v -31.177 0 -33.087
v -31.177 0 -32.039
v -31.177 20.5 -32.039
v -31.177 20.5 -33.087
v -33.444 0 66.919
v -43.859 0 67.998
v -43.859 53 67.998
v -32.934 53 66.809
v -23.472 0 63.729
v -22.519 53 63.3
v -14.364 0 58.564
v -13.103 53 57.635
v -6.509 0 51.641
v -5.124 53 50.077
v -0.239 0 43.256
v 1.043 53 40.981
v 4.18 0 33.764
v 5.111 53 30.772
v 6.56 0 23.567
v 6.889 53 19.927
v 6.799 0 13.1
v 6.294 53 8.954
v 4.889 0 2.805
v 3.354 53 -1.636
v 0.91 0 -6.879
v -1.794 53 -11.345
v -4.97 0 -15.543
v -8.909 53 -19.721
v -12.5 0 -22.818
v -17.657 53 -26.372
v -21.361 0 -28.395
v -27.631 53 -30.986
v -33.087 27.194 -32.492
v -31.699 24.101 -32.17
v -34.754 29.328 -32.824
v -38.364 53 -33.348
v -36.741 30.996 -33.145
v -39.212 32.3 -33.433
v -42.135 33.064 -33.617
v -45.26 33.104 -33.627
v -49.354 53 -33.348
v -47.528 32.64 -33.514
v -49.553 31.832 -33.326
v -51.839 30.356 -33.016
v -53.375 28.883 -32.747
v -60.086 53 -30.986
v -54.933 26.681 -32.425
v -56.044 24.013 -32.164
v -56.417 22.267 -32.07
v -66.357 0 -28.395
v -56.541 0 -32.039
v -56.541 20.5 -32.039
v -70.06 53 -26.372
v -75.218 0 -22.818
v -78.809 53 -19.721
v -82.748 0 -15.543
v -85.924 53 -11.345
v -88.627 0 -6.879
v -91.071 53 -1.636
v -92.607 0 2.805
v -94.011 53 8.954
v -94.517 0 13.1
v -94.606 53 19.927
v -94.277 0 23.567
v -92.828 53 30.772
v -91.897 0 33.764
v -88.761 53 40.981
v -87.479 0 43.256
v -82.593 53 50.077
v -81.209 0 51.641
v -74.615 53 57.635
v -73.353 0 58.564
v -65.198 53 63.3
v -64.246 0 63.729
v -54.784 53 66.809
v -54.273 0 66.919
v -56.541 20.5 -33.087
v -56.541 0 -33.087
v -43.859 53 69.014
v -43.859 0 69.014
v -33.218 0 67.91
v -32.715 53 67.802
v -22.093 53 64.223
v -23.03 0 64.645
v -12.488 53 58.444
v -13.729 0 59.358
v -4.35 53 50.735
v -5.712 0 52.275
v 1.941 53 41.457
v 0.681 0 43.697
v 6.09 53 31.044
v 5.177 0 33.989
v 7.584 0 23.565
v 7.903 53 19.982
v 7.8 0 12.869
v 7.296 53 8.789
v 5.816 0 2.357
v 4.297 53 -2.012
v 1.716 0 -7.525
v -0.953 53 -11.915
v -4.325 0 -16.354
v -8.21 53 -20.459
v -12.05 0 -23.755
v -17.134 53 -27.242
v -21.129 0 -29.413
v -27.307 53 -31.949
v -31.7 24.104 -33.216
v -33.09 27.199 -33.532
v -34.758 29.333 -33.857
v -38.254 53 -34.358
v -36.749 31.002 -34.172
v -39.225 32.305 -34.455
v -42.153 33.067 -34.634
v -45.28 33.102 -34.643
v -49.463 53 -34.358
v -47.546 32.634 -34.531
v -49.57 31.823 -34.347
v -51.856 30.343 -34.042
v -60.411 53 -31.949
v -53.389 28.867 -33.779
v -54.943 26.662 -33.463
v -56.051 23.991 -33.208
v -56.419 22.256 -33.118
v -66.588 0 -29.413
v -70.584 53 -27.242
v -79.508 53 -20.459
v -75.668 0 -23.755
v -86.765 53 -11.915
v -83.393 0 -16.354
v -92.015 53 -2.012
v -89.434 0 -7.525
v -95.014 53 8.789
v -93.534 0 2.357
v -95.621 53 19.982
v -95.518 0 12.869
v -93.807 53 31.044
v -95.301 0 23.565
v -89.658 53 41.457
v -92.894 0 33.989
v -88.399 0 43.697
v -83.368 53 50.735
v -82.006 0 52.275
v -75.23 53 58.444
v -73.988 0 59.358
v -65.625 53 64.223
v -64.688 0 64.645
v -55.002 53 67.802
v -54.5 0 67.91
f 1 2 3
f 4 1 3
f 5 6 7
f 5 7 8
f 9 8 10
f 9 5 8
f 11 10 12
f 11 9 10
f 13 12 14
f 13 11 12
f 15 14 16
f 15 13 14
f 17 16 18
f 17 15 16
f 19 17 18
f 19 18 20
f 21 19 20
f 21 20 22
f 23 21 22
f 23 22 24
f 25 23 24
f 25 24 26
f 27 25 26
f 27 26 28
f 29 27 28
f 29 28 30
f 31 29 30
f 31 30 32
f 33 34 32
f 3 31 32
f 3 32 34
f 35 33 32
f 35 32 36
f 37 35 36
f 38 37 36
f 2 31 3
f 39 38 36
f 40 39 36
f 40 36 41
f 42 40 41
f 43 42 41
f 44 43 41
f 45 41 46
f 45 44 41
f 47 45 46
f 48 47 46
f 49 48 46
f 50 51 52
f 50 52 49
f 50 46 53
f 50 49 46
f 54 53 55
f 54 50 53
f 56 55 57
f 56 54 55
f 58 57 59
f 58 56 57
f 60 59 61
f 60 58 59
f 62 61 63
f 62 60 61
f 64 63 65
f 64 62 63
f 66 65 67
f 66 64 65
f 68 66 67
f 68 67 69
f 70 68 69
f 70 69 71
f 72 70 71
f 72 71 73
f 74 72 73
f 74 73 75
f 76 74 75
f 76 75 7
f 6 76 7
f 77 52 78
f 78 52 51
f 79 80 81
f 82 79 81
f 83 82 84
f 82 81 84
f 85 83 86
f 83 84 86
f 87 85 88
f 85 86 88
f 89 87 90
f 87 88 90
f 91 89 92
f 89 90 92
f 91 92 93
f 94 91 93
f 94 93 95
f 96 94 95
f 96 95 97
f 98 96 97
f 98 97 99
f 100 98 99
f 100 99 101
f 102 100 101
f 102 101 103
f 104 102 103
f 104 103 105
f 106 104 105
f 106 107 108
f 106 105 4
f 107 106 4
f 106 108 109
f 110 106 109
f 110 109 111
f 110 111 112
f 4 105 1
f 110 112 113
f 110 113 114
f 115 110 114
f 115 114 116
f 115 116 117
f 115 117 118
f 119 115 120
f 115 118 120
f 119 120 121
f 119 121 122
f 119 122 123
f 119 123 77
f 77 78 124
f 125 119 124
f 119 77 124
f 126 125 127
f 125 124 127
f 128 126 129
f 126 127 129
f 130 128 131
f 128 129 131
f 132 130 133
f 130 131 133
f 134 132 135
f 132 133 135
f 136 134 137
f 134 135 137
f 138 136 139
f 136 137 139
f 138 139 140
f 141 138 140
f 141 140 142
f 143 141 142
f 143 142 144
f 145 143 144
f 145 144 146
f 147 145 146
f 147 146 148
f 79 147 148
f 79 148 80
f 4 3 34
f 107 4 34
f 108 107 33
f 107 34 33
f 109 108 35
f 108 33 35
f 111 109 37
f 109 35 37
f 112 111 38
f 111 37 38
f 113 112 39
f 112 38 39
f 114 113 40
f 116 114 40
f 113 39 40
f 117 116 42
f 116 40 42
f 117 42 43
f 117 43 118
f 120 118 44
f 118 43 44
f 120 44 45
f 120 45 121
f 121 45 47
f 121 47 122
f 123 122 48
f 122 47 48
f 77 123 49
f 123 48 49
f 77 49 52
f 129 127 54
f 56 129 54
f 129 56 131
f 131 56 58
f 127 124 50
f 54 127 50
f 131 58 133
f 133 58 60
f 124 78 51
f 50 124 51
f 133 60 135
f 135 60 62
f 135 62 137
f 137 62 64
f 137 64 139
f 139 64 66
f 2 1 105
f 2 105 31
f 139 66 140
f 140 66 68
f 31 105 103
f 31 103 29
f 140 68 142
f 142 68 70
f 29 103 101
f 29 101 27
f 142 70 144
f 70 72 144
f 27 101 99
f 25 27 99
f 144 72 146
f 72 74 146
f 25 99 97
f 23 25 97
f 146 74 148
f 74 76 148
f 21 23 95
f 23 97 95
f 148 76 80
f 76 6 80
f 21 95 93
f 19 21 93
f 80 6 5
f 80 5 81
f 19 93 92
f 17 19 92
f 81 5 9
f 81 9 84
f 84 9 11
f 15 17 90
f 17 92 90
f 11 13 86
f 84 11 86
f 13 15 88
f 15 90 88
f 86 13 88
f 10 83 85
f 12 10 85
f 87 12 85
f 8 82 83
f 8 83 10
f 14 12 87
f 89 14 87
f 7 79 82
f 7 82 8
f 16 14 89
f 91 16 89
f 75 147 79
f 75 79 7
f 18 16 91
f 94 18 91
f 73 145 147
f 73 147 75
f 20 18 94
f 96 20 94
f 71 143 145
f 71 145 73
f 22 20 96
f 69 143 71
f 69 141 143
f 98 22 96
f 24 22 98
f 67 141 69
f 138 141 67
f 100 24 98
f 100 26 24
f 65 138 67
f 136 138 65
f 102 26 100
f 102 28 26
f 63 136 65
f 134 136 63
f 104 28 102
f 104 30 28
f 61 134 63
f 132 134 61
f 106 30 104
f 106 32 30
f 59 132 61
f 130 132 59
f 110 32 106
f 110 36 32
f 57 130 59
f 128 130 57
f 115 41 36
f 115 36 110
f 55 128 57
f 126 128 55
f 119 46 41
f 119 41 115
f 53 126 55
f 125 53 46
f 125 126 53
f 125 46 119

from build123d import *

# Parameters (mm, degrees)
SKETCH1_R           = 51.838
SKETCH1_R_2         = 50.822
BOSS_EXTRUDE1_DEPTH = 54
CUT_EXTRUDE1_DEPTH  = 53
CUT_EXTRUDE2_START  = -1
SKETCH3_R           = 51.838
SKETCH3_R_2         = 50.822
CUT_EXTRUDE2_DEPTH  = 1


with BuildPart() as part:
    # Sketch1 → Boss-Extrude1 (new body)
    with BuildSketch(Plane(origin=(0, 0, 0), x_dir=(1, 0, 0), z_dir=(0, 1, 0))):
        with Locations(Location((-43.858802719, -17.175645915, 0), (0, 0, 270))):
            Circle(SKETCH1_R)
        with Locations(Location((-43.858802719, -17.175645915, 0), (0, 0, 270))):
            Circle(SKETCH1_R_2, mode=Mode.SUBTRACT)
    extrude(amount=BOSS_EXTRUDE1_DEPTH)

    # Sketch2 → Cut-Extrude1 (cut)
    with BuildSketch(Plane.XY):
        with BuildLine():
            Line((-56.540802719, 20.5), (-56.540802719, -11.133422885))
            Line((-56.540802719, -11.133422885), (-31.176802719, -11.133422885))
            Line((-31.176802719, -11.133422885), (-31.176802719, 20.5))
            ThreePointArc((-31.176802719, 20.5), (-43.858802719, 33.182), (-56.540802719, 20.5))
        make_face()
    extrude(amount=-CUT_EXTRUDE1_DEPTH, mode=Mode.SUBTRACT)

    # Sketch3 → Cut-Extrude2 (cut)
    with BuildSketch(Plane(origin=(0, 54, 0), x_dir=(1, 0, 0), z_dir=(0, 1, 0)).offset(CUT_EXTRUDE2_START)):
        with Locations(Location((-43.858802719, -17.175645915, 0), (0, 0, 75.839039259))):
            Circle(SKETCH3_R)
        with Locations(Location((-43.858802719, -17.175645915, 0), (0, 0, 75.54984846))):
            Circle(SKETCH3_R_2, mode=Mode.SUBTRACT)
    extrude(amount=CUT_EXTRUDE2_DEPTH, mode=Mode.SUBTRACT)


solid = part.part
